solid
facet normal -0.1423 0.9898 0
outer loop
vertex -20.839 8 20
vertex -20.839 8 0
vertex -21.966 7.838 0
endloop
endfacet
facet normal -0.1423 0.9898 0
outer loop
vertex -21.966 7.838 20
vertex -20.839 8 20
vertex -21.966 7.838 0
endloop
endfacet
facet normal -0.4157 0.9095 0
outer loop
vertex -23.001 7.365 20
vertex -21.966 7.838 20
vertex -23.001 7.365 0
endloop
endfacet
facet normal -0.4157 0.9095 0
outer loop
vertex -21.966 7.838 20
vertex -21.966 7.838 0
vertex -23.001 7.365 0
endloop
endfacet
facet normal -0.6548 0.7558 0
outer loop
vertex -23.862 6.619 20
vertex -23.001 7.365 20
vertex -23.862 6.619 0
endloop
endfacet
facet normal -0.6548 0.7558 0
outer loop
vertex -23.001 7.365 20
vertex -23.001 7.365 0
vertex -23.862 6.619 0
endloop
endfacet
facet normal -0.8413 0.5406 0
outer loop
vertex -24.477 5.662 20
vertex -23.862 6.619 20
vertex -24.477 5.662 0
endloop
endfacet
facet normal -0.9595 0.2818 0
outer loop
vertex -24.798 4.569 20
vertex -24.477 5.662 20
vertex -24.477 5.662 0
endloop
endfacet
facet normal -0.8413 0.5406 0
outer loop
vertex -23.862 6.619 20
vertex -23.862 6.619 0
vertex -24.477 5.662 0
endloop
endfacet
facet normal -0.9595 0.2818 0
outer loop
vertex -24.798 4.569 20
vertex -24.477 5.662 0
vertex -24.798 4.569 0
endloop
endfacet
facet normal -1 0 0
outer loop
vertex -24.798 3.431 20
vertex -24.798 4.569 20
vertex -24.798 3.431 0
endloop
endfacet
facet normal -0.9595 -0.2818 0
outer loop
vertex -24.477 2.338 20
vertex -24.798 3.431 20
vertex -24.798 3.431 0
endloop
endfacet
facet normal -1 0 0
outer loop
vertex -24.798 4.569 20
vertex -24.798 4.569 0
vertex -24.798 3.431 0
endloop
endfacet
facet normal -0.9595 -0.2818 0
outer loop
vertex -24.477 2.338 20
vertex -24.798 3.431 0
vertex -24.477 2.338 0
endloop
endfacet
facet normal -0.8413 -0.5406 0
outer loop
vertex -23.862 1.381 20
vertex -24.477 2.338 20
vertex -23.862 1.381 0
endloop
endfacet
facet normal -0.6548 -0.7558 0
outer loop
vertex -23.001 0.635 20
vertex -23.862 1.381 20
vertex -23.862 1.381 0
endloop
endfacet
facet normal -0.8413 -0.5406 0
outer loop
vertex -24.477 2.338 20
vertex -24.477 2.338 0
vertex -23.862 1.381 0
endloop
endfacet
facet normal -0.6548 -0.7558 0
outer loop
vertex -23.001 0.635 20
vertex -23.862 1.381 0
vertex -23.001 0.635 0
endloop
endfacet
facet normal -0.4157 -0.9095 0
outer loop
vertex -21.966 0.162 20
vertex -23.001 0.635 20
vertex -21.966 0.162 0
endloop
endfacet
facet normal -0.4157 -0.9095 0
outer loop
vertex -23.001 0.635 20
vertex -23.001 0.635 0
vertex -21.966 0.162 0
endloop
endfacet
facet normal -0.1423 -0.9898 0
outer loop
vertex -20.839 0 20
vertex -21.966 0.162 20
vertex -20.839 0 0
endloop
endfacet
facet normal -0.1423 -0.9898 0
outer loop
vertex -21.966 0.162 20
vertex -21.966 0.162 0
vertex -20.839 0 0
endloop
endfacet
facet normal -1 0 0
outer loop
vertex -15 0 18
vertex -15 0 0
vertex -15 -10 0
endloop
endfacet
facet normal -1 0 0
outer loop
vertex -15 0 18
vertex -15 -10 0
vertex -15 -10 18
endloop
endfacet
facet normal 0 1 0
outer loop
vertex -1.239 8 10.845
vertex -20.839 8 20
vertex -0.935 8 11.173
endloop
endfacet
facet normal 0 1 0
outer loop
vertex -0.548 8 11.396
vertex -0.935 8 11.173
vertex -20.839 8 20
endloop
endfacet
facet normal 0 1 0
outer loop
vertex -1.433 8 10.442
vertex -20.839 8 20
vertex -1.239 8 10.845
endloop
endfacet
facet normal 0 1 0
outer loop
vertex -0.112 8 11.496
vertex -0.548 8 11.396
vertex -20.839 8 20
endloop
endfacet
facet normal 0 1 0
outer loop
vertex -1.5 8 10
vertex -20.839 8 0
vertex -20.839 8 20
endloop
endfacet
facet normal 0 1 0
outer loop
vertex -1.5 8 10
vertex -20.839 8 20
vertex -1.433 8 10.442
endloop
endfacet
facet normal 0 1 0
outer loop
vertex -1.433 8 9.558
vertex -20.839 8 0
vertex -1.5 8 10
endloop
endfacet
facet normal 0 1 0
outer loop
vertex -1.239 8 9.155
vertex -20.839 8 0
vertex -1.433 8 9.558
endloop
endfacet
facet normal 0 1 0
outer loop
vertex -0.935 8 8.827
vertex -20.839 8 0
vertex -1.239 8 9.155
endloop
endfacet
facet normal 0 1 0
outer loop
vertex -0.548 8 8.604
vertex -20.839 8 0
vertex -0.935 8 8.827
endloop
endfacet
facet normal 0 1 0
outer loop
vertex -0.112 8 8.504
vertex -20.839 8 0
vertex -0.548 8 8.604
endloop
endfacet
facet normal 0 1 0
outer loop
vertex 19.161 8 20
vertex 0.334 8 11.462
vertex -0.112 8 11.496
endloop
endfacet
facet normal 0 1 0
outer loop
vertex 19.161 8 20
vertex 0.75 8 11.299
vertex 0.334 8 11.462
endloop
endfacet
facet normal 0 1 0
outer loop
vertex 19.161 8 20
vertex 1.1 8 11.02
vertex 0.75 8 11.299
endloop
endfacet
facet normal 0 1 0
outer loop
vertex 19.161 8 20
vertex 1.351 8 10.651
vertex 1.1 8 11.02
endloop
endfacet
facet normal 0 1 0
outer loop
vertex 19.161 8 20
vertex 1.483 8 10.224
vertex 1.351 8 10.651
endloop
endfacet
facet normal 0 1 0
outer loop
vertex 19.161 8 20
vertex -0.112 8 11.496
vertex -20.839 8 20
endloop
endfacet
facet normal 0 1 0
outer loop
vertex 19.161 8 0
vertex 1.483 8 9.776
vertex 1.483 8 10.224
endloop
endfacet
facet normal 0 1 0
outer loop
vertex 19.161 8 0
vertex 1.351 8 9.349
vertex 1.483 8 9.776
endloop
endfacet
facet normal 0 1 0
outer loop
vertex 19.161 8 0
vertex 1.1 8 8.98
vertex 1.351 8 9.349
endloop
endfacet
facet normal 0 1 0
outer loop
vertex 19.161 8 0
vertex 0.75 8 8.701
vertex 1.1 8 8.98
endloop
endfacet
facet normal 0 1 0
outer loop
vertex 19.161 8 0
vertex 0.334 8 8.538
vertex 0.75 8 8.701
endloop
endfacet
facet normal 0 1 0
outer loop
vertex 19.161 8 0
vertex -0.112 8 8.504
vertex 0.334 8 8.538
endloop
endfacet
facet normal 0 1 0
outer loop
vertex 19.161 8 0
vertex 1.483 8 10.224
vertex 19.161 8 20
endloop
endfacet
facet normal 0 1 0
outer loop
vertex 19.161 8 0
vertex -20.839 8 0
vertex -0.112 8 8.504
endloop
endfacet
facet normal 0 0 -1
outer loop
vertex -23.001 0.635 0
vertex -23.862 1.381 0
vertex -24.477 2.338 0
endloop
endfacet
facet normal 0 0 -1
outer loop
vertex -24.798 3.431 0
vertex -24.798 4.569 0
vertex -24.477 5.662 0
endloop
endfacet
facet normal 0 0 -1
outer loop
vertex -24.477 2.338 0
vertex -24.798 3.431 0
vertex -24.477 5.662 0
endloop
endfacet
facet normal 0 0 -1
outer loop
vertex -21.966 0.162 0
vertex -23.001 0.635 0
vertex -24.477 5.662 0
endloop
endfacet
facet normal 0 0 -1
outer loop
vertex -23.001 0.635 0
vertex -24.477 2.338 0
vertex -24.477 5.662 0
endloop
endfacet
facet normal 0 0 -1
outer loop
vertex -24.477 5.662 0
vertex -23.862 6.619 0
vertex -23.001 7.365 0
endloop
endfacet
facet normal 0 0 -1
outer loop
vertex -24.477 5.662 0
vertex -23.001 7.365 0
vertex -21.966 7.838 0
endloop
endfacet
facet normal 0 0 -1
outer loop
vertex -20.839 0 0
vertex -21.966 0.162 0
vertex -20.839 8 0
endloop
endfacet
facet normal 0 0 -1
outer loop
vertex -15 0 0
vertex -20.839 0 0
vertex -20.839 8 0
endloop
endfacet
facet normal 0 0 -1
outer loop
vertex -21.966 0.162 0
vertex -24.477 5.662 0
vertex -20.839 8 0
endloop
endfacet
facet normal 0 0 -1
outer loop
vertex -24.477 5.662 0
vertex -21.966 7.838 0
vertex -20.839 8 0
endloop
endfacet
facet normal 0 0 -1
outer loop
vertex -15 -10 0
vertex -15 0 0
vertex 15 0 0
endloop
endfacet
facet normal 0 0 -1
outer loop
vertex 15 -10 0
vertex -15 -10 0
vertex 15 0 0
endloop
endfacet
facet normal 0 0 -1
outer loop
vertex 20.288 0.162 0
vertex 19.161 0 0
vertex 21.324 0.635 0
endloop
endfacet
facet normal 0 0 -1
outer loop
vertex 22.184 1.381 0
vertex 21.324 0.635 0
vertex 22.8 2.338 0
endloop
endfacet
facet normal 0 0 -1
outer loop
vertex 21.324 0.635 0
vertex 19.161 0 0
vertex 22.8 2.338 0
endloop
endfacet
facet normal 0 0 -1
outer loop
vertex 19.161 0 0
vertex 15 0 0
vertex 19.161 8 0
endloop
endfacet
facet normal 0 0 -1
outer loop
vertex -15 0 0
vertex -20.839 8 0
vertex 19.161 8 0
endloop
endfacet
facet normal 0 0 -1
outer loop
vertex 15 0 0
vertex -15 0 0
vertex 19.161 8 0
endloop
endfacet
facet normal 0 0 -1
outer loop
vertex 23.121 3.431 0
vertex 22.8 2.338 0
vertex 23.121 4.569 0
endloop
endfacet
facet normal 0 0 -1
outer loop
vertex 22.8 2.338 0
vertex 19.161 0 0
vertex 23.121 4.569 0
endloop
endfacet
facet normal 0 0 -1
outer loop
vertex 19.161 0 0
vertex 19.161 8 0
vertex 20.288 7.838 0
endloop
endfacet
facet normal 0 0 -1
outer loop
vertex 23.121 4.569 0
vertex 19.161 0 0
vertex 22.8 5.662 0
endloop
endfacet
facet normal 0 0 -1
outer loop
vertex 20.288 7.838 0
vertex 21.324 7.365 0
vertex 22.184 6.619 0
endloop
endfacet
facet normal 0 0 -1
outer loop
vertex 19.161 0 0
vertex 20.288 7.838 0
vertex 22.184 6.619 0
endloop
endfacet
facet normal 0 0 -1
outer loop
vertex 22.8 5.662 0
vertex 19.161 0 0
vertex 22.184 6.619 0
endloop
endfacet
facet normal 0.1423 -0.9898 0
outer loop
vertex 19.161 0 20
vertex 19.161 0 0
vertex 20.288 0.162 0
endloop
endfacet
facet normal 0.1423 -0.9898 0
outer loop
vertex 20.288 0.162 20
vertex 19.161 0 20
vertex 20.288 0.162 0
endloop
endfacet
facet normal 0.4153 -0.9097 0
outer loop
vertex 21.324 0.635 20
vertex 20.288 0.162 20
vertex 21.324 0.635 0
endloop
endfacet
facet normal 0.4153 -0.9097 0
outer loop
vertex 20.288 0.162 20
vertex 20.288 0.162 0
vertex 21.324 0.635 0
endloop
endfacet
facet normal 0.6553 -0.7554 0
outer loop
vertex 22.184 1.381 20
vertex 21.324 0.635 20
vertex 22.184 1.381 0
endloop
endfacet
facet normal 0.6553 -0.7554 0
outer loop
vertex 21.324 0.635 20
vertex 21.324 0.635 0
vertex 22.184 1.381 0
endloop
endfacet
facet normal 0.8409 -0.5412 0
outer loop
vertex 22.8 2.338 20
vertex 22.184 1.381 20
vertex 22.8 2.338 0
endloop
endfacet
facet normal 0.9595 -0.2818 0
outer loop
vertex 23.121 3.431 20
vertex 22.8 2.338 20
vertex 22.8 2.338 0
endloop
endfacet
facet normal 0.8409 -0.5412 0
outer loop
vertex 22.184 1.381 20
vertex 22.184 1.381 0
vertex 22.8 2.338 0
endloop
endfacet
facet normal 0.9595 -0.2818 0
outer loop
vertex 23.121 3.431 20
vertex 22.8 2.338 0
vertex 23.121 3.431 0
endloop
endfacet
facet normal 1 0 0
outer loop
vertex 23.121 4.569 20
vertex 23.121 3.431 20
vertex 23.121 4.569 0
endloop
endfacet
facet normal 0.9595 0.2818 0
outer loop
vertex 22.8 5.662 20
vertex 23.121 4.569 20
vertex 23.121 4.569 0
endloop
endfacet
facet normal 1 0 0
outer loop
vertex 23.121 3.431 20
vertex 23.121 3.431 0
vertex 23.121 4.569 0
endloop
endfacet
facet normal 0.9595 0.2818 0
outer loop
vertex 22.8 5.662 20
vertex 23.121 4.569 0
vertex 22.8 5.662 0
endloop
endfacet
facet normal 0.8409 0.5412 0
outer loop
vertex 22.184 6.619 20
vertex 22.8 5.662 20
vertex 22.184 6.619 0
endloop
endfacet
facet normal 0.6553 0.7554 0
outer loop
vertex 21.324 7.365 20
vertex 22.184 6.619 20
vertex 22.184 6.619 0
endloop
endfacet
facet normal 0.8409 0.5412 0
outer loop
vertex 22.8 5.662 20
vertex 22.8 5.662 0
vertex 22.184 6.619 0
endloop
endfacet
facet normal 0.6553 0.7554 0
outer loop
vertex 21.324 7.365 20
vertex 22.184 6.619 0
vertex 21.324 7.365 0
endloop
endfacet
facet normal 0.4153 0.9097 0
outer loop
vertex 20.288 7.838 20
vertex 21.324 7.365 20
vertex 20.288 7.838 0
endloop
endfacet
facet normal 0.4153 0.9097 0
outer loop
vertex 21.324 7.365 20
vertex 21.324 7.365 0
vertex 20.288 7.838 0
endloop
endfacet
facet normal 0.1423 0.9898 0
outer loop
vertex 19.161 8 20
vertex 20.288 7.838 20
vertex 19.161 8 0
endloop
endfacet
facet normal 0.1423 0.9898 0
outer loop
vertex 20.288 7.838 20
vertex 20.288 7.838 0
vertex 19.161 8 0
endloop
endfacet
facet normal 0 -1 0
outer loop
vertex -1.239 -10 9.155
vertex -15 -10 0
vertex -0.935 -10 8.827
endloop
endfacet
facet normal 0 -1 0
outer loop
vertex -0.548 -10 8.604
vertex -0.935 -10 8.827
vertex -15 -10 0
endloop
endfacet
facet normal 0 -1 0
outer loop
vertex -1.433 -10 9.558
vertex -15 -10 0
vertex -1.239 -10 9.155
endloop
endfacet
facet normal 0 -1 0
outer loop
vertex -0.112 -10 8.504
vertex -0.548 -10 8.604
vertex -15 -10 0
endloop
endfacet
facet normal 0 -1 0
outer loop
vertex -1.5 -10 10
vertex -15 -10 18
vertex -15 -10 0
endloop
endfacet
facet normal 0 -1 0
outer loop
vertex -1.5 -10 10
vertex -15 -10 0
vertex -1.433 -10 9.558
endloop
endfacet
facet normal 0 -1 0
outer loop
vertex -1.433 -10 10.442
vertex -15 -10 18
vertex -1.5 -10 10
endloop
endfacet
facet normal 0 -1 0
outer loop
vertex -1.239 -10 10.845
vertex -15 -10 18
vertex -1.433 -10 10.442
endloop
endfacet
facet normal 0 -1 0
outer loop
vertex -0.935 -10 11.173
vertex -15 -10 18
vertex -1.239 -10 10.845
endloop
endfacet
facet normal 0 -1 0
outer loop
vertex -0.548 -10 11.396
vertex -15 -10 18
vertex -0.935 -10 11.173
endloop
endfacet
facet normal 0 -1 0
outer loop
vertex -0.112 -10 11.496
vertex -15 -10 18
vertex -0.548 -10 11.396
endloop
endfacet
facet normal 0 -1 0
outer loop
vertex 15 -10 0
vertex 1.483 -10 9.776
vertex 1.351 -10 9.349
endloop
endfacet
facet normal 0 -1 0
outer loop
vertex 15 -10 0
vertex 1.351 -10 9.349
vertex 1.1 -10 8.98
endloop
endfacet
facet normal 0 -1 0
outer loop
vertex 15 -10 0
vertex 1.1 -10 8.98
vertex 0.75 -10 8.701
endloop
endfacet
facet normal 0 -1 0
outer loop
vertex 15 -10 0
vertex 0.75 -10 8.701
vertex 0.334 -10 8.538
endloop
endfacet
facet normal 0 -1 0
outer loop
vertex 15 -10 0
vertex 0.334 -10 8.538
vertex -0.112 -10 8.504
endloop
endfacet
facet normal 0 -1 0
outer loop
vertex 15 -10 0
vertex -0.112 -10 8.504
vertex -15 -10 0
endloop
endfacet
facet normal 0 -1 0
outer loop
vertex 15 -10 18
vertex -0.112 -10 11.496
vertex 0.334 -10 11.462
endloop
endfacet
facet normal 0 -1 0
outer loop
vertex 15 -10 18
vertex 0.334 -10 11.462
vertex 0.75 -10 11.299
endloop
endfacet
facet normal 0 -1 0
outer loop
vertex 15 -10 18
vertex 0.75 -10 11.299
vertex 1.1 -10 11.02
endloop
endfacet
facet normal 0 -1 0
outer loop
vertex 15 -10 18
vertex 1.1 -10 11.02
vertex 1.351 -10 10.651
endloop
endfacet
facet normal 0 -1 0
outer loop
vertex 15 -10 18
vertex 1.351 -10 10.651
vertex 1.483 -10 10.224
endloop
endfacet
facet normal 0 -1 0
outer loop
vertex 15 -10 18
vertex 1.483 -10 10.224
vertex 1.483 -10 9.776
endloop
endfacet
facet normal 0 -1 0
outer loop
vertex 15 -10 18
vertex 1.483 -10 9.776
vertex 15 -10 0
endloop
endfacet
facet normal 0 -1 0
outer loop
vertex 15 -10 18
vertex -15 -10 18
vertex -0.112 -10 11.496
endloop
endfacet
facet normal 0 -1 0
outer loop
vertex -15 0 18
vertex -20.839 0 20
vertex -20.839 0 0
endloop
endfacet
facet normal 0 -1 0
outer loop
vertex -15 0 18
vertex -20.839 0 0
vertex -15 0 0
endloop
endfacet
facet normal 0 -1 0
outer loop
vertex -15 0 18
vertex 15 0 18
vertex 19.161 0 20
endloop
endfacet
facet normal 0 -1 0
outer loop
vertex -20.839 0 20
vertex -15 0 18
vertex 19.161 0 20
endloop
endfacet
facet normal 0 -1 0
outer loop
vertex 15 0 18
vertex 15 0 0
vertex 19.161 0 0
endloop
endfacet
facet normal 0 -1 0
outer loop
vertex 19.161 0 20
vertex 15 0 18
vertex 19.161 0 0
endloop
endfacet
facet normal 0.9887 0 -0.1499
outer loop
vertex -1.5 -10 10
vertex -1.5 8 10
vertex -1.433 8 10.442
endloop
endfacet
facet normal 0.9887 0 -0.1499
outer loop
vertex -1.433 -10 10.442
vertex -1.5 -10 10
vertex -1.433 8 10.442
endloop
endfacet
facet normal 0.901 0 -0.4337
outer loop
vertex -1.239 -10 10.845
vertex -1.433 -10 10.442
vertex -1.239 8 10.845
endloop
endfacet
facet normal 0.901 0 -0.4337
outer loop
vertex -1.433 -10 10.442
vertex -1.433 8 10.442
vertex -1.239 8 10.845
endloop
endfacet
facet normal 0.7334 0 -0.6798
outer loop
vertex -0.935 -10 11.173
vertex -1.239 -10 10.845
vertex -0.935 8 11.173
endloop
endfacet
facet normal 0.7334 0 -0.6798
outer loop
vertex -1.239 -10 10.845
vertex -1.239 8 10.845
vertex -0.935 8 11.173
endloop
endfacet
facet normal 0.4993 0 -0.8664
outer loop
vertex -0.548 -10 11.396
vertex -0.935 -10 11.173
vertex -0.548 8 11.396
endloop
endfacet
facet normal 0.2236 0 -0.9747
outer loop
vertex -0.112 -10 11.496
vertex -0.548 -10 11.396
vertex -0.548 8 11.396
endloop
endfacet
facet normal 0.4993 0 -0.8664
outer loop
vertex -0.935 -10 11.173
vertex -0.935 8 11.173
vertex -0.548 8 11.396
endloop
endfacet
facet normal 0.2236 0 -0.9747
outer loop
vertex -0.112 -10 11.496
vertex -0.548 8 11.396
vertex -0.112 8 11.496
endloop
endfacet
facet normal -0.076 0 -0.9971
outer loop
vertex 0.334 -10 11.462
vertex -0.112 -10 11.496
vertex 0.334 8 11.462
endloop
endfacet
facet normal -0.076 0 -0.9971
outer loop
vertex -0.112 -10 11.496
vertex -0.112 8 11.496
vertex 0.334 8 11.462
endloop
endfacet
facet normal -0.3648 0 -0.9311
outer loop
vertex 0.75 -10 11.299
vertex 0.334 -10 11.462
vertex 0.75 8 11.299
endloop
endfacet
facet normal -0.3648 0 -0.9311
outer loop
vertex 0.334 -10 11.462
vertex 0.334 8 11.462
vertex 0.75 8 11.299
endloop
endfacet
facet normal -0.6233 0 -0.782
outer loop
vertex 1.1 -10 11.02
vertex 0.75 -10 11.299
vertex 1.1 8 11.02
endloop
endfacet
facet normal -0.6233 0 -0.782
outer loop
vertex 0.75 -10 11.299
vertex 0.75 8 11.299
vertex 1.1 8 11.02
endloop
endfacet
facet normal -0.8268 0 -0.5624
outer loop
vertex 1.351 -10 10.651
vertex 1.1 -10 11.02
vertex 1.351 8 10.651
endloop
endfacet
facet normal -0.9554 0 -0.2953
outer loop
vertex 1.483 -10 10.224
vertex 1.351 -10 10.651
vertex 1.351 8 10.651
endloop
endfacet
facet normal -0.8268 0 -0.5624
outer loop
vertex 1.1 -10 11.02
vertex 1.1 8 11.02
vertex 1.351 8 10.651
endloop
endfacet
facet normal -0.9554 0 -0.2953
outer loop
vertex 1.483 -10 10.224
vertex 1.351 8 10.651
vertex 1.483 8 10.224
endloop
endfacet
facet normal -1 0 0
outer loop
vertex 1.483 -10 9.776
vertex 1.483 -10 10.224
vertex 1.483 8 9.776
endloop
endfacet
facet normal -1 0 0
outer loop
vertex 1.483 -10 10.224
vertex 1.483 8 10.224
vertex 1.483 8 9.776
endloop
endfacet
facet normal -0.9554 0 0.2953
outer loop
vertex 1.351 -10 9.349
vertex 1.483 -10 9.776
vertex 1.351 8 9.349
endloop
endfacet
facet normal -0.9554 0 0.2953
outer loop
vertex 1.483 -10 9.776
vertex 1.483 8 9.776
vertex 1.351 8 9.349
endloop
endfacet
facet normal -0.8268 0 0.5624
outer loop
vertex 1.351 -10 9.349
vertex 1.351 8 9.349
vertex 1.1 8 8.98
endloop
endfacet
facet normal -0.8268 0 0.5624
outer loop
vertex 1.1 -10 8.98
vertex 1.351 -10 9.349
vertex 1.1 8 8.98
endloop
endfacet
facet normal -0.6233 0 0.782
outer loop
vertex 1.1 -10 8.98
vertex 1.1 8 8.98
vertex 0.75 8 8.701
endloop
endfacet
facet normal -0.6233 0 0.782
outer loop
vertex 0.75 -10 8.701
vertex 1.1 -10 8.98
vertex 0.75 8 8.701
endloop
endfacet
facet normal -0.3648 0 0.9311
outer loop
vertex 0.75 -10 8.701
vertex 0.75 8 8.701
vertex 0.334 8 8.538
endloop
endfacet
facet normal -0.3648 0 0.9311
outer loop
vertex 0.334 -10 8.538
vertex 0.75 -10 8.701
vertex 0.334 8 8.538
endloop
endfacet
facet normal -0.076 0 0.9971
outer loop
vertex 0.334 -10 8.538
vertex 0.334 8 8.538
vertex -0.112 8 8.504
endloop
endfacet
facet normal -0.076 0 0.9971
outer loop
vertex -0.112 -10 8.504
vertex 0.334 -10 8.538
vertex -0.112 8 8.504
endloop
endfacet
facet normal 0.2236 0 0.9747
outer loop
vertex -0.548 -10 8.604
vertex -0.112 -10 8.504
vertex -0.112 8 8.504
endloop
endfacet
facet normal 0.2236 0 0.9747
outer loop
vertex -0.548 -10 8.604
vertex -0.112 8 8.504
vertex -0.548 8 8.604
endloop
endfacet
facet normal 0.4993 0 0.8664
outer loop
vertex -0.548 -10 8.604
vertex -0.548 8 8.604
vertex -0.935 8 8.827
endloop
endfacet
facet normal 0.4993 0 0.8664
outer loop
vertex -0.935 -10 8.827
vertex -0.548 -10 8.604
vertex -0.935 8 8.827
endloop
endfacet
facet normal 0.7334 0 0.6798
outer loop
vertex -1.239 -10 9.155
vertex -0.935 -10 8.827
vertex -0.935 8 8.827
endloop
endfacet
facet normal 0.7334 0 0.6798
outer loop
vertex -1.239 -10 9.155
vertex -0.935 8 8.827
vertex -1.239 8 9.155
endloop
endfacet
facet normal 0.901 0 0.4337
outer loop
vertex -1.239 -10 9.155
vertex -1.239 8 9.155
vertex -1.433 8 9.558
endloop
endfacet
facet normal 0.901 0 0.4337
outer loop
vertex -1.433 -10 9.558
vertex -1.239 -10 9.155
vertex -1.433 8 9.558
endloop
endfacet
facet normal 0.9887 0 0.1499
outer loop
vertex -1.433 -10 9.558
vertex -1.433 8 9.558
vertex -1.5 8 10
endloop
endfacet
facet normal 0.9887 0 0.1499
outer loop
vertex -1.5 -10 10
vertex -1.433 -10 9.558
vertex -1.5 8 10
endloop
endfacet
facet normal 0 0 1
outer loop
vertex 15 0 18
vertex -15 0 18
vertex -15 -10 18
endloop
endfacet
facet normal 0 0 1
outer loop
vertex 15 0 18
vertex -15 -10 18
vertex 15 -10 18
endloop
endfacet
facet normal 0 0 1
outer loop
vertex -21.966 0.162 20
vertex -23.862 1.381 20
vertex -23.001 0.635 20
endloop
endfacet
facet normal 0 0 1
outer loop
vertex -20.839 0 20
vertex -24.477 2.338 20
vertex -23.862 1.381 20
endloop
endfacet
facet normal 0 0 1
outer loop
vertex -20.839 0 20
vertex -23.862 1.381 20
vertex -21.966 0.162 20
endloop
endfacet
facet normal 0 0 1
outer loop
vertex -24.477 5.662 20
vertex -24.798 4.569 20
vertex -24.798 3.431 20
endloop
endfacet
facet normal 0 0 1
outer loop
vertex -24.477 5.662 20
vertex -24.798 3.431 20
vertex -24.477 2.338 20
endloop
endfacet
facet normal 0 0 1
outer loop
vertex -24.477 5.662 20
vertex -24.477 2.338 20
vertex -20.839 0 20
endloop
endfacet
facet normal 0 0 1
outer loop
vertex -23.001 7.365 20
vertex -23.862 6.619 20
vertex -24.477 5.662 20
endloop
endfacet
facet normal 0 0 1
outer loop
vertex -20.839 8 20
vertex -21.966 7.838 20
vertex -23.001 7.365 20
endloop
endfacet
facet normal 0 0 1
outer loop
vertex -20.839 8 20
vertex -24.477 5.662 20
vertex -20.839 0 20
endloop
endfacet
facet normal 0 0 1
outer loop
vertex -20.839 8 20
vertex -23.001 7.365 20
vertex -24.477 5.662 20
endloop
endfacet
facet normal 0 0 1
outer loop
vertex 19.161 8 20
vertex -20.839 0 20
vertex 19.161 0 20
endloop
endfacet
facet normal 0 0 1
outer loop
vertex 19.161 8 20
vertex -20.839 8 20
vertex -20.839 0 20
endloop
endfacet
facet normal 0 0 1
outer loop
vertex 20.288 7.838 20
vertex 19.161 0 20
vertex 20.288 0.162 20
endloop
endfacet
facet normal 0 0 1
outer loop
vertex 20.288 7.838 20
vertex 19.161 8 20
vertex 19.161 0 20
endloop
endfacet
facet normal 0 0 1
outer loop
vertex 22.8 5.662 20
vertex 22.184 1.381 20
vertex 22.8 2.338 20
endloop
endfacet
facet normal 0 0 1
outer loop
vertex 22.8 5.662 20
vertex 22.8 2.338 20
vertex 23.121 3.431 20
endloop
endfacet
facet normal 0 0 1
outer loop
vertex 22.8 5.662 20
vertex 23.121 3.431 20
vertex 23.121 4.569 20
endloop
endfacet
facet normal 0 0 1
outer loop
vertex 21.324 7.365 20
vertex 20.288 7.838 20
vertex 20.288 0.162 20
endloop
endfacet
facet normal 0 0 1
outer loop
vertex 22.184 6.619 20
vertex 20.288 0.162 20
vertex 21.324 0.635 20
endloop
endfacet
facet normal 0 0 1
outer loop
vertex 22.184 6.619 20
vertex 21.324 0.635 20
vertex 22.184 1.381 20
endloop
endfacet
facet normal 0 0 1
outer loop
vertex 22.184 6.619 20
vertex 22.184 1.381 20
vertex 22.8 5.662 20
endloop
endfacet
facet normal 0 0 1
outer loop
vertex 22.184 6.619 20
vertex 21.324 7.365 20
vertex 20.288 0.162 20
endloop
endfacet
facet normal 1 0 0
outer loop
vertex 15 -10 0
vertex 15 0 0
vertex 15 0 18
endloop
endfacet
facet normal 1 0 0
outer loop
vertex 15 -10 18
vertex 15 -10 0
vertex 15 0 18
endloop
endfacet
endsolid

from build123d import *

# Parameters (mm, degrees)
PAD_DEPTH    = 20
SKETCH001_W  = 30
SKETCH001_H  = 18
PAD001_DEPTH = 10
SKETCH002_R  = 1.5
POCKET_DEPTH = 18.001


with BuildPart() as part:
    # Sketch → Pad (new body)
    with BuildSketch(Plane.XY):
        with BuildLine():
            ThreePointArc((-20.838728, 8), (-24.838728, 4), (-20.838728, 0))
            Line((-20.838728, 0), (19.161272, 0))
            ThreePointArc((19.161272, 0), (23.161272, 4), (19.161272, 8))
            Line((-20.838728, 8), (19.161272, 8))
        make_face()
    extrude(amount=PAD_DEPTH)

    # Sketch001 (on Face2 of Pad) → Pad001 (join)
    with BuildSketch(Plane.XZ):
        with Locations((0, 9)):
            Rectangle(SKETCH001_W, SKETCH001_H)
    extrude(amount=PAD001_DEPTH)

    # Sketch002 → Pocket (cut, through all)
    with BuildSketch(Plane(origin=(0, 8, 0), x_dir=(-1, 0, 0), z_dir=(0, 1, 0))):
        with Locations((0, 10)):
            Circle(SKETCH002_R)
    extrude(amount=-POCKET_DEPTH, mode=Mode.SUBTRACT)


solid = part.part
